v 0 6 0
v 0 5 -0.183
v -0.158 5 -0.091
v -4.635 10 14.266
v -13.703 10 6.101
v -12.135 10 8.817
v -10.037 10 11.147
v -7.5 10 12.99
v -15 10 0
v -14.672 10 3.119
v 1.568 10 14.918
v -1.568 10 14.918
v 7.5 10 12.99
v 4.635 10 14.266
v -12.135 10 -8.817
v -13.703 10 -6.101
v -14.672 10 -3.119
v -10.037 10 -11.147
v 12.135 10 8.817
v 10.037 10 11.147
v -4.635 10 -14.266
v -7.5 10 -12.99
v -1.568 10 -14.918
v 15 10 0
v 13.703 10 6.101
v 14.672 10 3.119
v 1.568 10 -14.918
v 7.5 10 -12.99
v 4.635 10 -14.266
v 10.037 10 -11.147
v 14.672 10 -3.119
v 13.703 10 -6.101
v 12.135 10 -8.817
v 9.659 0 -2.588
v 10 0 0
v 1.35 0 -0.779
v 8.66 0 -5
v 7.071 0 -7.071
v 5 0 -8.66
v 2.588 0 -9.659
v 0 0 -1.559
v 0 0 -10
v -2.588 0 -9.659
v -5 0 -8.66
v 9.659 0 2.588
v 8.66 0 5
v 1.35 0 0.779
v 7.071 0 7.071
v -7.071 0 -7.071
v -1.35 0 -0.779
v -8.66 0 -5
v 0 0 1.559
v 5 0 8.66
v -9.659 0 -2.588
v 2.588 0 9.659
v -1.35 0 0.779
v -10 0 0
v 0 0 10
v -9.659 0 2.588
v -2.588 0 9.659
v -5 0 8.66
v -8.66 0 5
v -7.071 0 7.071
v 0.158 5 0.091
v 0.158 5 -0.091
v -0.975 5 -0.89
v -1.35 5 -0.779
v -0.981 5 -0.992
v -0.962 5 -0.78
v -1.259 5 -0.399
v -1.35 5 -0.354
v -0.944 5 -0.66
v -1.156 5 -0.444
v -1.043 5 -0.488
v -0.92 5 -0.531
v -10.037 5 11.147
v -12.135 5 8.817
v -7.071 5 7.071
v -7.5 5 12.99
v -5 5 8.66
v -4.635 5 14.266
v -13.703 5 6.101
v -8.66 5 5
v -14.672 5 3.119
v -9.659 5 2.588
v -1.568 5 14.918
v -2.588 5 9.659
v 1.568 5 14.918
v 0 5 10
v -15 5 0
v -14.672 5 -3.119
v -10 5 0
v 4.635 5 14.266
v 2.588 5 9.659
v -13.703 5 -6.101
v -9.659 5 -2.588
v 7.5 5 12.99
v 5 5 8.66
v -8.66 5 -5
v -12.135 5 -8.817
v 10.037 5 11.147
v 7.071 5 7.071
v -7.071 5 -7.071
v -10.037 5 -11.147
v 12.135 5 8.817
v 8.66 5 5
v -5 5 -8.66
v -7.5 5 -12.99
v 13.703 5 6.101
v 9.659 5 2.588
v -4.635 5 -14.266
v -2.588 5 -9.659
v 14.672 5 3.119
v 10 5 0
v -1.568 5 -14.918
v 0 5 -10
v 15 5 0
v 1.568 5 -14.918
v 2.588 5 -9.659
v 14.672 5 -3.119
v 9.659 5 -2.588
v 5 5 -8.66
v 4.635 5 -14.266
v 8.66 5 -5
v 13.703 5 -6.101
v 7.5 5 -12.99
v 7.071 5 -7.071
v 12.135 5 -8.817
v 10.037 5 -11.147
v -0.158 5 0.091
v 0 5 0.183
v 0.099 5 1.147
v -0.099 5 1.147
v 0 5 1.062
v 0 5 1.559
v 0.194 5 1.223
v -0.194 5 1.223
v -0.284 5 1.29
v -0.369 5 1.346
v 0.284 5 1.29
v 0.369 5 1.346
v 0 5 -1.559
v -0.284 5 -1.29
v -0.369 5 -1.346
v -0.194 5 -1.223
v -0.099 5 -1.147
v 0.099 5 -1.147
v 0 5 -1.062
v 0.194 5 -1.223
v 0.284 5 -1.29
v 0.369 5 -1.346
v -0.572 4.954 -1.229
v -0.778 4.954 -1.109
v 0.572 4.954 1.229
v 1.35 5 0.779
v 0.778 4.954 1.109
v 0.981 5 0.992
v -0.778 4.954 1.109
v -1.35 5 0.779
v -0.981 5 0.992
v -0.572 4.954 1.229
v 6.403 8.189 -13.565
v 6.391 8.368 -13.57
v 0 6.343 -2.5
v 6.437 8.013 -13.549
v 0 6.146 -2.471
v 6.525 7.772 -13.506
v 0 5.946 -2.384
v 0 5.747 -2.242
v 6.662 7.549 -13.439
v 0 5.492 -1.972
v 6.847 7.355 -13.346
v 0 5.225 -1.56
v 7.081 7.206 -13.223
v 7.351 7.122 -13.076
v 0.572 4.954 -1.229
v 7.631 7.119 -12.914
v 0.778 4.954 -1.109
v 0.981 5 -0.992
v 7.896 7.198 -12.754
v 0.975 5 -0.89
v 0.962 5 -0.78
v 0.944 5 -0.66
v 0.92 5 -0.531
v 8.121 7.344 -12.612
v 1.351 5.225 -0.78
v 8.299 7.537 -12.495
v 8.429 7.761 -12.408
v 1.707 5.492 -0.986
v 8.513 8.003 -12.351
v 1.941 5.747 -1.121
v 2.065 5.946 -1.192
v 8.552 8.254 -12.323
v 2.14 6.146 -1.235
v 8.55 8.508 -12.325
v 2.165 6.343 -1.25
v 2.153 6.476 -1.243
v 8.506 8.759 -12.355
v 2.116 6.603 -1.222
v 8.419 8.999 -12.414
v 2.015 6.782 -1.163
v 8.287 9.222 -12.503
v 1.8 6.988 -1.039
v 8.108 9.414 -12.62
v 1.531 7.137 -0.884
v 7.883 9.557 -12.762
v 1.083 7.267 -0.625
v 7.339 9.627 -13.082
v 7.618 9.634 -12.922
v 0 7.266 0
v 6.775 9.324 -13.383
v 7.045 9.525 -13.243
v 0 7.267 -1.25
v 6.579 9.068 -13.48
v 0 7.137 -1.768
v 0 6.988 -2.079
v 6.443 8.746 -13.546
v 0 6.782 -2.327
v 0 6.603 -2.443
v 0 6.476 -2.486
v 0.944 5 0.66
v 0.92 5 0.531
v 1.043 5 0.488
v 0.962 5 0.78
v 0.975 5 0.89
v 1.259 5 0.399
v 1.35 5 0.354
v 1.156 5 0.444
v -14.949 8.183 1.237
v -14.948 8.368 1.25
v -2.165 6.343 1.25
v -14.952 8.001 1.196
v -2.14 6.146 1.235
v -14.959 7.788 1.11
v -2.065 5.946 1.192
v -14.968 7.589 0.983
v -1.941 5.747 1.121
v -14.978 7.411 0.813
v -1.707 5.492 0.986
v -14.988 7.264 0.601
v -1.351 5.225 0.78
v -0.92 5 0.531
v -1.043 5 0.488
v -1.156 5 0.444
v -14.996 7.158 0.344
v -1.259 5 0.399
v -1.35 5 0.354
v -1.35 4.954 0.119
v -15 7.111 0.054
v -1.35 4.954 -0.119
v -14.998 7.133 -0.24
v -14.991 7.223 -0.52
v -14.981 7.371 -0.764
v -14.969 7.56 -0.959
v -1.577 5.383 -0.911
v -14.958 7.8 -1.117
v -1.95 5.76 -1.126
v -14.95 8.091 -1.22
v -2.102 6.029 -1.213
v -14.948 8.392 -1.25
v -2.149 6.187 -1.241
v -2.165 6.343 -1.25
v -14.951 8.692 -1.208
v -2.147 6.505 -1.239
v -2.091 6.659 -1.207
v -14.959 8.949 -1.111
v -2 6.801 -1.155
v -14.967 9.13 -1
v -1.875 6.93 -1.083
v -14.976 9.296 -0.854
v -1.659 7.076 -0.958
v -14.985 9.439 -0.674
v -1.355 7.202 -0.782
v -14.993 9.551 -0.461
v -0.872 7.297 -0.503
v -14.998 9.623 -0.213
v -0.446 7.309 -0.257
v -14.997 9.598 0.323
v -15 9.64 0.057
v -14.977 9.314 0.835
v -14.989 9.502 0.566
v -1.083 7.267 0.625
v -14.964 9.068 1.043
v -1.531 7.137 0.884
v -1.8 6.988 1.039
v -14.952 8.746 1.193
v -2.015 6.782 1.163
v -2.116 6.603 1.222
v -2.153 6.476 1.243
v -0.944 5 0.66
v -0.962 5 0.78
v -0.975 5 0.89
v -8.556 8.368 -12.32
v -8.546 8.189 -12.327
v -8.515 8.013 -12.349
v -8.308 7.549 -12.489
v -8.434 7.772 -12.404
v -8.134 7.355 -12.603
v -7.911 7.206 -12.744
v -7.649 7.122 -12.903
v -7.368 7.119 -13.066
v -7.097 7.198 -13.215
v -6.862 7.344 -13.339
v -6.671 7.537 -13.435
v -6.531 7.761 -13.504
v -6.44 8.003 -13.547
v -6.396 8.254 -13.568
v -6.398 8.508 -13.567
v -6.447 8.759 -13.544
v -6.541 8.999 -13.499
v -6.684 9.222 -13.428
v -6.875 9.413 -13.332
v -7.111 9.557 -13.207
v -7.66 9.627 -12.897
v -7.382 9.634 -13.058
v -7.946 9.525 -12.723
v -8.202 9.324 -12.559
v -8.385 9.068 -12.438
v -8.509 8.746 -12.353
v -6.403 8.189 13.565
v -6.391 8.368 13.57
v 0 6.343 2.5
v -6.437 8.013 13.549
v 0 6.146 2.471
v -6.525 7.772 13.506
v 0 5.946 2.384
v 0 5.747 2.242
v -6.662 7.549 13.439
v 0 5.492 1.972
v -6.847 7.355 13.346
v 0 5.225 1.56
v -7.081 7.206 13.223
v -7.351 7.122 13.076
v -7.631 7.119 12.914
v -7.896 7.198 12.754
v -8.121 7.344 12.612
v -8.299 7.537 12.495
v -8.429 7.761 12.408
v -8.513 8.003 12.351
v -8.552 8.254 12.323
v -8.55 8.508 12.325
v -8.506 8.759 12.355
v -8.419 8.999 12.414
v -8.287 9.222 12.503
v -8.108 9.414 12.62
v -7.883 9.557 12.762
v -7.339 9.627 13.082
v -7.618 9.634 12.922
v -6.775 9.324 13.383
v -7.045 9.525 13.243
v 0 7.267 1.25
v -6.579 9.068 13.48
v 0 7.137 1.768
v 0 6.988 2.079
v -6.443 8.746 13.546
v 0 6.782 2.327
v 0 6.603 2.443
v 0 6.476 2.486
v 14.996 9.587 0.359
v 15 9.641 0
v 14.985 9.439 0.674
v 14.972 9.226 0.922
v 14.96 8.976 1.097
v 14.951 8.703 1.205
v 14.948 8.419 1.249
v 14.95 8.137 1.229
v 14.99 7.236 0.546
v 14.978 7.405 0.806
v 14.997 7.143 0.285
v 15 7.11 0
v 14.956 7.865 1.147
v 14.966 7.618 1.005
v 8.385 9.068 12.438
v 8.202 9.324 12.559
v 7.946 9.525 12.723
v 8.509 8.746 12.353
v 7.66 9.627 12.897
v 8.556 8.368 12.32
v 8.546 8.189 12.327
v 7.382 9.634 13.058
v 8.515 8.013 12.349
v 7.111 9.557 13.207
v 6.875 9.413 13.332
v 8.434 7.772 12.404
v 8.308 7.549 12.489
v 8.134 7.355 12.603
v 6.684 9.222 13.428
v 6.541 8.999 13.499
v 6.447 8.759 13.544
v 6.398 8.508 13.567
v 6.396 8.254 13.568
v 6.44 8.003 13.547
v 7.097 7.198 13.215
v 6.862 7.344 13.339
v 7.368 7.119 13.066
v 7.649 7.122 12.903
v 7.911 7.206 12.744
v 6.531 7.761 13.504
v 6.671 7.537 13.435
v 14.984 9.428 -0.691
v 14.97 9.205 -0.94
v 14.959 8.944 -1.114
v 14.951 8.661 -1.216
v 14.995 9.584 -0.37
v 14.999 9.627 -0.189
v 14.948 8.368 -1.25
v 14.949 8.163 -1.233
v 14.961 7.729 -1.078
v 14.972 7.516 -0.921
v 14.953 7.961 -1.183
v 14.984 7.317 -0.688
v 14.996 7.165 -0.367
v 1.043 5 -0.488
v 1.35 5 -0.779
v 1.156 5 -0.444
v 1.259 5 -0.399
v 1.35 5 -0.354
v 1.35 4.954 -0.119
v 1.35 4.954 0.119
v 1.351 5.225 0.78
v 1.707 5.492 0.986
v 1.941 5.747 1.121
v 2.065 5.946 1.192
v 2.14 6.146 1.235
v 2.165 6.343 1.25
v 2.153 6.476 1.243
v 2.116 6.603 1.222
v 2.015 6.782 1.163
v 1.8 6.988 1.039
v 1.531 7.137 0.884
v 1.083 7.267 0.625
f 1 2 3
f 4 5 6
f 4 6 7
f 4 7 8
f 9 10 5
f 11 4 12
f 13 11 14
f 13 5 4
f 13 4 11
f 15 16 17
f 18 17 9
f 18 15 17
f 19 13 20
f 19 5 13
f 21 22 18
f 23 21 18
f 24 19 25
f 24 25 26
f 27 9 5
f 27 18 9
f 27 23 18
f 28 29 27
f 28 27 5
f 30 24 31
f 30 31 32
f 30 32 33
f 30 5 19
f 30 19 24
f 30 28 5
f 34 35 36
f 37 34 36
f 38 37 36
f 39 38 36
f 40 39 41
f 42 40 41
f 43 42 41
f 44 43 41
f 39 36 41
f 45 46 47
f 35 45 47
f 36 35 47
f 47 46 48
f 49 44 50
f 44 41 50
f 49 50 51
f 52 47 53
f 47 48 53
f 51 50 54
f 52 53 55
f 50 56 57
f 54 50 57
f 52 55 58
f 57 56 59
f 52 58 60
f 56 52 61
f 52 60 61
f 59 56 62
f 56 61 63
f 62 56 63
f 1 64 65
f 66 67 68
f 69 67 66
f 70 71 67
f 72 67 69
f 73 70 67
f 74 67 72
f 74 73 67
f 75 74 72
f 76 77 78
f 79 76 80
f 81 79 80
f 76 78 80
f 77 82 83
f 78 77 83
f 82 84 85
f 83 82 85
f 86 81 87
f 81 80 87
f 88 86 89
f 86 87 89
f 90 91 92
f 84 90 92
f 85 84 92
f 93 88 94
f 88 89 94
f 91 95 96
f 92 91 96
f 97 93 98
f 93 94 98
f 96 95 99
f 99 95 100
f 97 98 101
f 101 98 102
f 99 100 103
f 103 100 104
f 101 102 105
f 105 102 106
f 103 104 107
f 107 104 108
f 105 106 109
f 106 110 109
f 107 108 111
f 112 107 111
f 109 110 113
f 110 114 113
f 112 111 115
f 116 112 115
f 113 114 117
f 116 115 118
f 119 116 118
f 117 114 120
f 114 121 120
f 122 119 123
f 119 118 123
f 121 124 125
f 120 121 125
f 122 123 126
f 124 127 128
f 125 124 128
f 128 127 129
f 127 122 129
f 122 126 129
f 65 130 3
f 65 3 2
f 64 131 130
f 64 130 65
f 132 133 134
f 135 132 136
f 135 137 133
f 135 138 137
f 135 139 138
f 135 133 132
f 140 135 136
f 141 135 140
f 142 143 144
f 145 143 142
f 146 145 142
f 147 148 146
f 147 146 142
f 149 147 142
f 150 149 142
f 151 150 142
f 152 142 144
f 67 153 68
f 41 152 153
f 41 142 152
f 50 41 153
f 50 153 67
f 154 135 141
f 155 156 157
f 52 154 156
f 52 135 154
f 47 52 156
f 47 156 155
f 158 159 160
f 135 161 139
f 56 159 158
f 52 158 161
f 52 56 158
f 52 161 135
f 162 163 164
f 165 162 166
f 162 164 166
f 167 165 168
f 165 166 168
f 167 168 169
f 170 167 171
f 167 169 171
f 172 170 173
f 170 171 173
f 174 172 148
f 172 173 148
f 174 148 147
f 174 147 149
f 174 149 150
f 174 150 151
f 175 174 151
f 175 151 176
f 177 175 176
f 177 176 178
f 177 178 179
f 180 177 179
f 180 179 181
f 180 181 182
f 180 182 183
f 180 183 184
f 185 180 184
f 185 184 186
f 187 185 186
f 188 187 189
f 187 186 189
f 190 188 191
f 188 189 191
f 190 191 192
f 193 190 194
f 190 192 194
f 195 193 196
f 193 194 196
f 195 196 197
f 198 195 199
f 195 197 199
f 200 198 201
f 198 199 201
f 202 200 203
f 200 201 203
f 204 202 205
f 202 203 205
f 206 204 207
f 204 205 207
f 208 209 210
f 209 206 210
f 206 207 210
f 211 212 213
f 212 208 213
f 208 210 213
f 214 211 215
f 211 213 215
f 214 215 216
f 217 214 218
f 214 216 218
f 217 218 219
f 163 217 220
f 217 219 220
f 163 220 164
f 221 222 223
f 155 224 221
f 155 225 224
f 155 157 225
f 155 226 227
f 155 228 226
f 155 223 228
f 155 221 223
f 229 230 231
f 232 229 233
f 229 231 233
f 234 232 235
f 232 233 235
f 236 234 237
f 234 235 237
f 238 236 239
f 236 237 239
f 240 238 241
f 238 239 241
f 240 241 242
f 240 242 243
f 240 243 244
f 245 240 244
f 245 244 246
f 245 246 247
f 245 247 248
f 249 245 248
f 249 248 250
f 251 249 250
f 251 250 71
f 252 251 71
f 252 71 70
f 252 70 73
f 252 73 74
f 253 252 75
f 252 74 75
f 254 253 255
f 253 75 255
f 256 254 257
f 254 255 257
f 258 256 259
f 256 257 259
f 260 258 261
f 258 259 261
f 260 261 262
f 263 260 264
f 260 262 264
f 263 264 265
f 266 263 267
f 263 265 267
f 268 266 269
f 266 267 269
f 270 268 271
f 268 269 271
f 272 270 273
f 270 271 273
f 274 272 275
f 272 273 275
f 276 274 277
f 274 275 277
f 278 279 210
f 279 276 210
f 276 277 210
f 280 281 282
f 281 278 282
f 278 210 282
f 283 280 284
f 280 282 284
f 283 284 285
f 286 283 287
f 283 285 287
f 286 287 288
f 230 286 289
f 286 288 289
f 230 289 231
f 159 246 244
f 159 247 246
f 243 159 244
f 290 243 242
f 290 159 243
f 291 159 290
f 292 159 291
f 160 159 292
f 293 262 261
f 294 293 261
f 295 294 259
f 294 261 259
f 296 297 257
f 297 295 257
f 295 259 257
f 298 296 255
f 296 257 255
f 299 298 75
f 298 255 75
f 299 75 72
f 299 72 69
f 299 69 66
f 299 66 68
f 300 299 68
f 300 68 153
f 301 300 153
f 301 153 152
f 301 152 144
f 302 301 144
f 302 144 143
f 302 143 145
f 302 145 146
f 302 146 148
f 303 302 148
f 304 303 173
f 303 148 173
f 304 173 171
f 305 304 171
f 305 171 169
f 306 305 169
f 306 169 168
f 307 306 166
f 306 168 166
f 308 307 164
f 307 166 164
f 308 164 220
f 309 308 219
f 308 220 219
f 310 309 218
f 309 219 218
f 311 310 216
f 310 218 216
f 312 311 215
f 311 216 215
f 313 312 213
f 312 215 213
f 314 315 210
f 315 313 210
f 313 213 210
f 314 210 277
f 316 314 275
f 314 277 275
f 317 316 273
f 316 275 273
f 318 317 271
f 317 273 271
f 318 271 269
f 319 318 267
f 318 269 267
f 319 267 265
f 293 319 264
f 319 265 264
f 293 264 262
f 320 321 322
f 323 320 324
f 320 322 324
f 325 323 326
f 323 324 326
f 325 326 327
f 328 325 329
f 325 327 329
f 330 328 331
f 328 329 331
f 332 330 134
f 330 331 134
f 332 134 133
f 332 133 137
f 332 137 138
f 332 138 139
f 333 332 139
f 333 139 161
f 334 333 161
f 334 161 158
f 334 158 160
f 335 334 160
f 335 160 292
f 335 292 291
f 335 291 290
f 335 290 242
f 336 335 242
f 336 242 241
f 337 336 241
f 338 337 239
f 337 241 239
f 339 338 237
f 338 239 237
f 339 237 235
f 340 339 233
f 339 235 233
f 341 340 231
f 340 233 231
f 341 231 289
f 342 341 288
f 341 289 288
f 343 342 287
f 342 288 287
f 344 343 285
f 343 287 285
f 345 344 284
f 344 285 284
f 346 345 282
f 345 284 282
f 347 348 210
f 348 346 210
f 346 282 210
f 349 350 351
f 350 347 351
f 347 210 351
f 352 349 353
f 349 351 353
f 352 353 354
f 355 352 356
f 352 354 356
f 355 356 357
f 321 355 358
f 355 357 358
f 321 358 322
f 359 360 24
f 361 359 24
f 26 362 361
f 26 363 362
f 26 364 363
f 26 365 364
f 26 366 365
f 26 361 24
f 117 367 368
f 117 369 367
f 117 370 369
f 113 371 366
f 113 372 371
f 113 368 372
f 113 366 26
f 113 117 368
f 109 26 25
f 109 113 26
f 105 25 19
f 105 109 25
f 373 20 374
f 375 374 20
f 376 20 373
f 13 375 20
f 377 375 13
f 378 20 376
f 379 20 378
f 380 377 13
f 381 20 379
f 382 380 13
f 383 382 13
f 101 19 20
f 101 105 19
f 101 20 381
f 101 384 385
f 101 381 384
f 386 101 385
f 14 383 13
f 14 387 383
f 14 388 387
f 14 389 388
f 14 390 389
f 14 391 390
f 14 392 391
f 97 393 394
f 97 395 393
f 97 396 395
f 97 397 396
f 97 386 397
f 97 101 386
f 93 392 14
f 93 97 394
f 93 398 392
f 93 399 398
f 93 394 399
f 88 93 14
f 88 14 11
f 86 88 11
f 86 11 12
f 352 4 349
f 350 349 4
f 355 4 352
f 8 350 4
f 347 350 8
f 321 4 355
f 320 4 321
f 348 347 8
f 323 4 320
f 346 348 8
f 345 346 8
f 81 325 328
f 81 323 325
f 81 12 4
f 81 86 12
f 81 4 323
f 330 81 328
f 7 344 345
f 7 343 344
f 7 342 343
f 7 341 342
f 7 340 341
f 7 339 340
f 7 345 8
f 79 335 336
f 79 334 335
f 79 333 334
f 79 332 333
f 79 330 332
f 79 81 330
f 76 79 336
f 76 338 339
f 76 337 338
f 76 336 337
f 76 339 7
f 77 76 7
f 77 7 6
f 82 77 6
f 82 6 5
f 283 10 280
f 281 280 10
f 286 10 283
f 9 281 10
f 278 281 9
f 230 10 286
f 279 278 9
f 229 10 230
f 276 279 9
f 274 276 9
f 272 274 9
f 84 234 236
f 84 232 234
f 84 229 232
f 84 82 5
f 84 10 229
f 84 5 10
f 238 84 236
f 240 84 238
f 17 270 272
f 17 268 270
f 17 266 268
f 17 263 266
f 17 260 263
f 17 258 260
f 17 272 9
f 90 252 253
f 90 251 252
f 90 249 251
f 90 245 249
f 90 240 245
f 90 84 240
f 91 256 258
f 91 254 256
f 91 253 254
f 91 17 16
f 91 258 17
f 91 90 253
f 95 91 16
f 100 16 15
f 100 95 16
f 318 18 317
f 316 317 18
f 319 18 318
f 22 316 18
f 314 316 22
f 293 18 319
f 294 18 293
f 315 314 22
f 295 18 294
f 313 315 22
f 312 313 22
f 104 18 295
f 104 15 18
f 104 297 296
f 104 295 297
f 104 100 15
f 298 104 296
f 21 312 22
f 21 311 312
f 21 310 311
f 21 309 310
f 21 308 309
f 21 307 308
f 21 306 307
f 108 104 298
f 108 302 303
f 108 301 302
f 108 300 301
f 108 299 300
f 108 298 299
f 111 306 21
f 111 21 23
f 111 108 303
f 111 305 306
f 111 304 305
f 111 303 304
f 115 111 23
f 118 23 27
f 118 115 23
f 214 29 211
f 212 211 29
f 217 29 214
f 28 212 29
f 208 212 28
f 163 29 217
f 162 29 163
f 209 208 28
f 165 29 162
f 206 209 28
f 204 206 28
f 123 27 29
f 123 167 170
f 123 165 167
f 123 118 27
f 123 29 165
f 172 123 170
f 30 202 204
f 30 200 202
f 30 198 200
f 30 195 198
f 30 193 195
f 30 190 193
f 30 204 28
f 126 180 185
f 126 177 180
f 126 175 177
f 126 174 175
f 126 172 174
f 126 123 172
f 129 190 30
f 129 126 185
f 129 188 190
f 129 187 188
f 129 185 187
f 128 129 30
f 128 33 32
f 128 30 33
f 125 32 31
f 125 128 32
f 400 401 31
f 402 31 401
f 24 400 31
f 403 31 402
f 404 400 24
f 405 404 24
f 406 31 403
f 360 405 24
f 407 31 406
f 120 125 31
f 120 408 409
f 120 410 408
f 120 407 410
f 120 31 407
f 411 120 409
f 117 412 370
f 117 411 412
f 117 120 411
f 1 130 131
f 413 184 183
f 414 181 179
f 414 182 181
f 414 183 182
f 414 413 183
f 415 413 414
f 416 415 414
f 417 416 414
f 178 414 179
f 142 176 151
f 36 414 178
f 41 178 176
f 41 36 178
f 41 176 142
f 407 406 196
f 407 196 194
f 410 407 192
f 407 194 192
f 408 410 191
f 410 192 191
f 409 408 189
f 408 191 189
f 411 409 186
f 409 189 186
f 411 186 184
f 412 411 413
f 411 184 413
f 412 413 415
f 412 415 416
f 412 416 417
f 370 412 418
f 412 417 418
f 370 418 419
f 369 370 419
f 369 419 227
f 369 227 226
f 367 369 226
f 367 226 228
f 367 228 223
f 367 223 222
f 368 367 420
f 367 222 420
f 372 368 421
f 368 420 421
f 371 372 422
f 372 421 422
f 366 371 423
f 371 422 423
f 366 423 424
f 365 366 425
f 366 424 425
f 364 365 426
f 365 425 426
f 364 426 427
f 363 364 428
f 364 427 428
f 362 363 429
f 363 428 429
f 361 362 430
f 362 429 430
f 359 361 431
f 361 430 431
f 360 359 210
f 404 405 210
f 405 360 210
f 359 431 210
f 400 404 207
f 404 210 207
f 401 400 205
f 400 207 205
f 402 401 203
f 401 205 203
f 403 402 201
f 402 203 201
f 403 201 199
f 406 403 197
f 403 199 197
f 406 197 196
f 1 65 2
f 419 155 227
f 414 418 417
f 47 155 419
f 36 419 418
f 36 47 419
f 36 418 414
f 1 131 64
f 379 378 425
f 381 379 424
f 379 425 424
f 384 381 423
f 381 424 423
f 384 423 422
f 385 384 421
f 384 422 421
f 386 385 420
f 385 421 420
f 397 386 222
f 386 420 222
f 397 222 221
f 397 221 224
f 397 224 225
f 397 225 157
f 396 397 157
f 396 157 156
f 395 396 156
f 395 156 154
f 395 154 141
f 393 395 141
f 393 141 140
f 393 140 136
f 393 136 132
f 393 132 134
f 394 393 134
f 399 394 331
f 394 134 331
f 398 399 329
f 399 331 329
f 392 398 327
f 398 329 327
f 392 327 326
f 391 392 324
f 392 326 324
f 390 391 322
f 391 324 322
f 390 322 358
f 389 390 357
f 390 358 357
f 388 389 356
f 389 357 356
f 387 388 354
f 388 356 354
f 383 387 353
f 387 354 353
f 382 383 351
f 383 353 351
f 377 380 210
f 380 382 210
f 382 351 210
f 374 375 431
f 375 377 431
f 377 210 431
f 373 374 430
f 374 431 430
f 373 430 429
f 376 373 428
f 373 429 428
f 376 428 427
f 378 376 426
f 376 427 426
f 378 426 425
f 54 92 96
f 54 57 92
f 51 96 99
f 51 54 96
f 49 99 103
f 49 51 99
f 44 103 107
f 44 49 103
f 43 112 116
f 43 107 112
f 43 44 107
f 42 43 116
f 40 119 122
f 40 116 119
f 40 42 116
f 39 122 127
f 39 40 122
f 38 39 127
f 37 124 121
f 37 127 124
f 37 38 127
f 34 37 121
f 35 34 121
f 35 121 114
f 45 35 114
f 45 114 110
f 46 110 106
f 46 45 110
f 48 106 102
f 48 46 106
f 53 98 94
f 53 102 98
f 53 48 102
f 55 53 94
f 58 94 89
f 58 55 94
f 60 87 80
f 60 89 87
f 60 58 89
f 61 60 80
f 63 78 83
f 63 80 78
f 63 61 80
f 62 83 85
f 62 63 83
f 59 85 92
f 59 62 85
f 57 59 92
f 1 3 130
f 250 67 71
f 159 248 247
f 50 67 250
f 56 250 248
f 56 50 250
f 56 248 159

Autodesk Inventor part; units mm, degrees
ref_plane "YZ Plane" through (0, 0, 0) normal (1, 0, 0) x (0, 1, 0)
ref_plane "XZ Plane" through (0, 0, 0) normal (0, 1, 0) x (-1, 0, 0)
sketch "スケッチ1" plane through (0, 0, 0) normal (0, 1, 0) x (-1, 0, 0)
  circle A0 centre (0, 0) radius 10
  dimension "d0" = 20
extrude "押し出し1" add sketch "スケッチ1" along normal blind 5
sketch "スケッチ2" plane through (0, 5, 0) normal (0, 1, 0) x (1, 0, 0)
  circle A0 centre (0, 0) radius 15
  dimension "dia_rod_base" = 30
extrude "押し出し2" add sketch "スケッチ2" along normal blind 5
sketch "スケッチ5" plane through (0, 0, 0) normal (0, -1, 0) x (1, 0, 0)
  line L0 (0, 1.5588) -> (1.35, 0.7794)
  line L1 (1.35, 0.7794) -> (1.35, -0.7794)
  line L2 (1.35, -0.7794) -> (0, -1.5588)
  line L3 (0, -1.5588) -> (-1.35, -0.7794)
  line L4 (-1.35, -0.7794) -> (-1.35, 0.7794)
  line L5 (-1.35, 0.7794) -> (0, 1.5588)
  point P0 (0, 0)
  point P1 (0, 0)
  dimension "d14" = 2.7
extrude "押し出し3" cut sketch "スケッチ5" against normal blind 5
ref_plane "作業平面1" through (0, 0, 3) normal (0, 0, 1) x (1, 0, 0)
sketch "スケッチ10" plane through (0, 0, 3) normal (0, 0, 1) x (1, 0, 0)
  line L0 (15, 10) -> (-15, 10) projected
  line L1 (15, 10) -> (-15, 10) projected
  line L2 (15, 5) -> (-15.5269, 7.0351)
  line L3 (15, 5) -> (15, 10) projected
  line L4 (15, 5) -> (-15.5269, 7.0351)
  point P0 (0, 0)
  point P1 (0, 6)
  point P2 (0, 10)
  point P3 (-0.2635, 6.0176)
  dimension "d30" = 15
  dimension "d37" = 4
ref_plane "作業平面2" through (0, 6, 3) normal (-0.9877, 0.1564, 0) x (0, 0, 1)
sketch "スケッチ11" plane through (0, 6, 3) normal (-0.9877, 0.1564, 0) x (0, 0, 1)
  circle A0 centre (-3, 0) radius 1.25
  line L0 (-18, -0.9877) -> (-18, 3.9508) projected
  line L1 (12, -0.9877) -> (12, 3.9508) projected
  line L2 (-24, 0) -> (18, 0) projected
  point P0 (-3, -5.9261)
  dimension "d32" = 2.5
  dimension "d33" = 15
extrude "押し出し6" cut sketch "スケッチ11" along normal through all
pattern_circular "円形状パターン2" count 6 over 360 about axis through (0, 5, 0) along (0, 1, 0) of "押し出し6"
equation "\"d30\" = 0.5 * dia_rod_base"
properties part number "exp_tire_6rod_upper_rev0"
